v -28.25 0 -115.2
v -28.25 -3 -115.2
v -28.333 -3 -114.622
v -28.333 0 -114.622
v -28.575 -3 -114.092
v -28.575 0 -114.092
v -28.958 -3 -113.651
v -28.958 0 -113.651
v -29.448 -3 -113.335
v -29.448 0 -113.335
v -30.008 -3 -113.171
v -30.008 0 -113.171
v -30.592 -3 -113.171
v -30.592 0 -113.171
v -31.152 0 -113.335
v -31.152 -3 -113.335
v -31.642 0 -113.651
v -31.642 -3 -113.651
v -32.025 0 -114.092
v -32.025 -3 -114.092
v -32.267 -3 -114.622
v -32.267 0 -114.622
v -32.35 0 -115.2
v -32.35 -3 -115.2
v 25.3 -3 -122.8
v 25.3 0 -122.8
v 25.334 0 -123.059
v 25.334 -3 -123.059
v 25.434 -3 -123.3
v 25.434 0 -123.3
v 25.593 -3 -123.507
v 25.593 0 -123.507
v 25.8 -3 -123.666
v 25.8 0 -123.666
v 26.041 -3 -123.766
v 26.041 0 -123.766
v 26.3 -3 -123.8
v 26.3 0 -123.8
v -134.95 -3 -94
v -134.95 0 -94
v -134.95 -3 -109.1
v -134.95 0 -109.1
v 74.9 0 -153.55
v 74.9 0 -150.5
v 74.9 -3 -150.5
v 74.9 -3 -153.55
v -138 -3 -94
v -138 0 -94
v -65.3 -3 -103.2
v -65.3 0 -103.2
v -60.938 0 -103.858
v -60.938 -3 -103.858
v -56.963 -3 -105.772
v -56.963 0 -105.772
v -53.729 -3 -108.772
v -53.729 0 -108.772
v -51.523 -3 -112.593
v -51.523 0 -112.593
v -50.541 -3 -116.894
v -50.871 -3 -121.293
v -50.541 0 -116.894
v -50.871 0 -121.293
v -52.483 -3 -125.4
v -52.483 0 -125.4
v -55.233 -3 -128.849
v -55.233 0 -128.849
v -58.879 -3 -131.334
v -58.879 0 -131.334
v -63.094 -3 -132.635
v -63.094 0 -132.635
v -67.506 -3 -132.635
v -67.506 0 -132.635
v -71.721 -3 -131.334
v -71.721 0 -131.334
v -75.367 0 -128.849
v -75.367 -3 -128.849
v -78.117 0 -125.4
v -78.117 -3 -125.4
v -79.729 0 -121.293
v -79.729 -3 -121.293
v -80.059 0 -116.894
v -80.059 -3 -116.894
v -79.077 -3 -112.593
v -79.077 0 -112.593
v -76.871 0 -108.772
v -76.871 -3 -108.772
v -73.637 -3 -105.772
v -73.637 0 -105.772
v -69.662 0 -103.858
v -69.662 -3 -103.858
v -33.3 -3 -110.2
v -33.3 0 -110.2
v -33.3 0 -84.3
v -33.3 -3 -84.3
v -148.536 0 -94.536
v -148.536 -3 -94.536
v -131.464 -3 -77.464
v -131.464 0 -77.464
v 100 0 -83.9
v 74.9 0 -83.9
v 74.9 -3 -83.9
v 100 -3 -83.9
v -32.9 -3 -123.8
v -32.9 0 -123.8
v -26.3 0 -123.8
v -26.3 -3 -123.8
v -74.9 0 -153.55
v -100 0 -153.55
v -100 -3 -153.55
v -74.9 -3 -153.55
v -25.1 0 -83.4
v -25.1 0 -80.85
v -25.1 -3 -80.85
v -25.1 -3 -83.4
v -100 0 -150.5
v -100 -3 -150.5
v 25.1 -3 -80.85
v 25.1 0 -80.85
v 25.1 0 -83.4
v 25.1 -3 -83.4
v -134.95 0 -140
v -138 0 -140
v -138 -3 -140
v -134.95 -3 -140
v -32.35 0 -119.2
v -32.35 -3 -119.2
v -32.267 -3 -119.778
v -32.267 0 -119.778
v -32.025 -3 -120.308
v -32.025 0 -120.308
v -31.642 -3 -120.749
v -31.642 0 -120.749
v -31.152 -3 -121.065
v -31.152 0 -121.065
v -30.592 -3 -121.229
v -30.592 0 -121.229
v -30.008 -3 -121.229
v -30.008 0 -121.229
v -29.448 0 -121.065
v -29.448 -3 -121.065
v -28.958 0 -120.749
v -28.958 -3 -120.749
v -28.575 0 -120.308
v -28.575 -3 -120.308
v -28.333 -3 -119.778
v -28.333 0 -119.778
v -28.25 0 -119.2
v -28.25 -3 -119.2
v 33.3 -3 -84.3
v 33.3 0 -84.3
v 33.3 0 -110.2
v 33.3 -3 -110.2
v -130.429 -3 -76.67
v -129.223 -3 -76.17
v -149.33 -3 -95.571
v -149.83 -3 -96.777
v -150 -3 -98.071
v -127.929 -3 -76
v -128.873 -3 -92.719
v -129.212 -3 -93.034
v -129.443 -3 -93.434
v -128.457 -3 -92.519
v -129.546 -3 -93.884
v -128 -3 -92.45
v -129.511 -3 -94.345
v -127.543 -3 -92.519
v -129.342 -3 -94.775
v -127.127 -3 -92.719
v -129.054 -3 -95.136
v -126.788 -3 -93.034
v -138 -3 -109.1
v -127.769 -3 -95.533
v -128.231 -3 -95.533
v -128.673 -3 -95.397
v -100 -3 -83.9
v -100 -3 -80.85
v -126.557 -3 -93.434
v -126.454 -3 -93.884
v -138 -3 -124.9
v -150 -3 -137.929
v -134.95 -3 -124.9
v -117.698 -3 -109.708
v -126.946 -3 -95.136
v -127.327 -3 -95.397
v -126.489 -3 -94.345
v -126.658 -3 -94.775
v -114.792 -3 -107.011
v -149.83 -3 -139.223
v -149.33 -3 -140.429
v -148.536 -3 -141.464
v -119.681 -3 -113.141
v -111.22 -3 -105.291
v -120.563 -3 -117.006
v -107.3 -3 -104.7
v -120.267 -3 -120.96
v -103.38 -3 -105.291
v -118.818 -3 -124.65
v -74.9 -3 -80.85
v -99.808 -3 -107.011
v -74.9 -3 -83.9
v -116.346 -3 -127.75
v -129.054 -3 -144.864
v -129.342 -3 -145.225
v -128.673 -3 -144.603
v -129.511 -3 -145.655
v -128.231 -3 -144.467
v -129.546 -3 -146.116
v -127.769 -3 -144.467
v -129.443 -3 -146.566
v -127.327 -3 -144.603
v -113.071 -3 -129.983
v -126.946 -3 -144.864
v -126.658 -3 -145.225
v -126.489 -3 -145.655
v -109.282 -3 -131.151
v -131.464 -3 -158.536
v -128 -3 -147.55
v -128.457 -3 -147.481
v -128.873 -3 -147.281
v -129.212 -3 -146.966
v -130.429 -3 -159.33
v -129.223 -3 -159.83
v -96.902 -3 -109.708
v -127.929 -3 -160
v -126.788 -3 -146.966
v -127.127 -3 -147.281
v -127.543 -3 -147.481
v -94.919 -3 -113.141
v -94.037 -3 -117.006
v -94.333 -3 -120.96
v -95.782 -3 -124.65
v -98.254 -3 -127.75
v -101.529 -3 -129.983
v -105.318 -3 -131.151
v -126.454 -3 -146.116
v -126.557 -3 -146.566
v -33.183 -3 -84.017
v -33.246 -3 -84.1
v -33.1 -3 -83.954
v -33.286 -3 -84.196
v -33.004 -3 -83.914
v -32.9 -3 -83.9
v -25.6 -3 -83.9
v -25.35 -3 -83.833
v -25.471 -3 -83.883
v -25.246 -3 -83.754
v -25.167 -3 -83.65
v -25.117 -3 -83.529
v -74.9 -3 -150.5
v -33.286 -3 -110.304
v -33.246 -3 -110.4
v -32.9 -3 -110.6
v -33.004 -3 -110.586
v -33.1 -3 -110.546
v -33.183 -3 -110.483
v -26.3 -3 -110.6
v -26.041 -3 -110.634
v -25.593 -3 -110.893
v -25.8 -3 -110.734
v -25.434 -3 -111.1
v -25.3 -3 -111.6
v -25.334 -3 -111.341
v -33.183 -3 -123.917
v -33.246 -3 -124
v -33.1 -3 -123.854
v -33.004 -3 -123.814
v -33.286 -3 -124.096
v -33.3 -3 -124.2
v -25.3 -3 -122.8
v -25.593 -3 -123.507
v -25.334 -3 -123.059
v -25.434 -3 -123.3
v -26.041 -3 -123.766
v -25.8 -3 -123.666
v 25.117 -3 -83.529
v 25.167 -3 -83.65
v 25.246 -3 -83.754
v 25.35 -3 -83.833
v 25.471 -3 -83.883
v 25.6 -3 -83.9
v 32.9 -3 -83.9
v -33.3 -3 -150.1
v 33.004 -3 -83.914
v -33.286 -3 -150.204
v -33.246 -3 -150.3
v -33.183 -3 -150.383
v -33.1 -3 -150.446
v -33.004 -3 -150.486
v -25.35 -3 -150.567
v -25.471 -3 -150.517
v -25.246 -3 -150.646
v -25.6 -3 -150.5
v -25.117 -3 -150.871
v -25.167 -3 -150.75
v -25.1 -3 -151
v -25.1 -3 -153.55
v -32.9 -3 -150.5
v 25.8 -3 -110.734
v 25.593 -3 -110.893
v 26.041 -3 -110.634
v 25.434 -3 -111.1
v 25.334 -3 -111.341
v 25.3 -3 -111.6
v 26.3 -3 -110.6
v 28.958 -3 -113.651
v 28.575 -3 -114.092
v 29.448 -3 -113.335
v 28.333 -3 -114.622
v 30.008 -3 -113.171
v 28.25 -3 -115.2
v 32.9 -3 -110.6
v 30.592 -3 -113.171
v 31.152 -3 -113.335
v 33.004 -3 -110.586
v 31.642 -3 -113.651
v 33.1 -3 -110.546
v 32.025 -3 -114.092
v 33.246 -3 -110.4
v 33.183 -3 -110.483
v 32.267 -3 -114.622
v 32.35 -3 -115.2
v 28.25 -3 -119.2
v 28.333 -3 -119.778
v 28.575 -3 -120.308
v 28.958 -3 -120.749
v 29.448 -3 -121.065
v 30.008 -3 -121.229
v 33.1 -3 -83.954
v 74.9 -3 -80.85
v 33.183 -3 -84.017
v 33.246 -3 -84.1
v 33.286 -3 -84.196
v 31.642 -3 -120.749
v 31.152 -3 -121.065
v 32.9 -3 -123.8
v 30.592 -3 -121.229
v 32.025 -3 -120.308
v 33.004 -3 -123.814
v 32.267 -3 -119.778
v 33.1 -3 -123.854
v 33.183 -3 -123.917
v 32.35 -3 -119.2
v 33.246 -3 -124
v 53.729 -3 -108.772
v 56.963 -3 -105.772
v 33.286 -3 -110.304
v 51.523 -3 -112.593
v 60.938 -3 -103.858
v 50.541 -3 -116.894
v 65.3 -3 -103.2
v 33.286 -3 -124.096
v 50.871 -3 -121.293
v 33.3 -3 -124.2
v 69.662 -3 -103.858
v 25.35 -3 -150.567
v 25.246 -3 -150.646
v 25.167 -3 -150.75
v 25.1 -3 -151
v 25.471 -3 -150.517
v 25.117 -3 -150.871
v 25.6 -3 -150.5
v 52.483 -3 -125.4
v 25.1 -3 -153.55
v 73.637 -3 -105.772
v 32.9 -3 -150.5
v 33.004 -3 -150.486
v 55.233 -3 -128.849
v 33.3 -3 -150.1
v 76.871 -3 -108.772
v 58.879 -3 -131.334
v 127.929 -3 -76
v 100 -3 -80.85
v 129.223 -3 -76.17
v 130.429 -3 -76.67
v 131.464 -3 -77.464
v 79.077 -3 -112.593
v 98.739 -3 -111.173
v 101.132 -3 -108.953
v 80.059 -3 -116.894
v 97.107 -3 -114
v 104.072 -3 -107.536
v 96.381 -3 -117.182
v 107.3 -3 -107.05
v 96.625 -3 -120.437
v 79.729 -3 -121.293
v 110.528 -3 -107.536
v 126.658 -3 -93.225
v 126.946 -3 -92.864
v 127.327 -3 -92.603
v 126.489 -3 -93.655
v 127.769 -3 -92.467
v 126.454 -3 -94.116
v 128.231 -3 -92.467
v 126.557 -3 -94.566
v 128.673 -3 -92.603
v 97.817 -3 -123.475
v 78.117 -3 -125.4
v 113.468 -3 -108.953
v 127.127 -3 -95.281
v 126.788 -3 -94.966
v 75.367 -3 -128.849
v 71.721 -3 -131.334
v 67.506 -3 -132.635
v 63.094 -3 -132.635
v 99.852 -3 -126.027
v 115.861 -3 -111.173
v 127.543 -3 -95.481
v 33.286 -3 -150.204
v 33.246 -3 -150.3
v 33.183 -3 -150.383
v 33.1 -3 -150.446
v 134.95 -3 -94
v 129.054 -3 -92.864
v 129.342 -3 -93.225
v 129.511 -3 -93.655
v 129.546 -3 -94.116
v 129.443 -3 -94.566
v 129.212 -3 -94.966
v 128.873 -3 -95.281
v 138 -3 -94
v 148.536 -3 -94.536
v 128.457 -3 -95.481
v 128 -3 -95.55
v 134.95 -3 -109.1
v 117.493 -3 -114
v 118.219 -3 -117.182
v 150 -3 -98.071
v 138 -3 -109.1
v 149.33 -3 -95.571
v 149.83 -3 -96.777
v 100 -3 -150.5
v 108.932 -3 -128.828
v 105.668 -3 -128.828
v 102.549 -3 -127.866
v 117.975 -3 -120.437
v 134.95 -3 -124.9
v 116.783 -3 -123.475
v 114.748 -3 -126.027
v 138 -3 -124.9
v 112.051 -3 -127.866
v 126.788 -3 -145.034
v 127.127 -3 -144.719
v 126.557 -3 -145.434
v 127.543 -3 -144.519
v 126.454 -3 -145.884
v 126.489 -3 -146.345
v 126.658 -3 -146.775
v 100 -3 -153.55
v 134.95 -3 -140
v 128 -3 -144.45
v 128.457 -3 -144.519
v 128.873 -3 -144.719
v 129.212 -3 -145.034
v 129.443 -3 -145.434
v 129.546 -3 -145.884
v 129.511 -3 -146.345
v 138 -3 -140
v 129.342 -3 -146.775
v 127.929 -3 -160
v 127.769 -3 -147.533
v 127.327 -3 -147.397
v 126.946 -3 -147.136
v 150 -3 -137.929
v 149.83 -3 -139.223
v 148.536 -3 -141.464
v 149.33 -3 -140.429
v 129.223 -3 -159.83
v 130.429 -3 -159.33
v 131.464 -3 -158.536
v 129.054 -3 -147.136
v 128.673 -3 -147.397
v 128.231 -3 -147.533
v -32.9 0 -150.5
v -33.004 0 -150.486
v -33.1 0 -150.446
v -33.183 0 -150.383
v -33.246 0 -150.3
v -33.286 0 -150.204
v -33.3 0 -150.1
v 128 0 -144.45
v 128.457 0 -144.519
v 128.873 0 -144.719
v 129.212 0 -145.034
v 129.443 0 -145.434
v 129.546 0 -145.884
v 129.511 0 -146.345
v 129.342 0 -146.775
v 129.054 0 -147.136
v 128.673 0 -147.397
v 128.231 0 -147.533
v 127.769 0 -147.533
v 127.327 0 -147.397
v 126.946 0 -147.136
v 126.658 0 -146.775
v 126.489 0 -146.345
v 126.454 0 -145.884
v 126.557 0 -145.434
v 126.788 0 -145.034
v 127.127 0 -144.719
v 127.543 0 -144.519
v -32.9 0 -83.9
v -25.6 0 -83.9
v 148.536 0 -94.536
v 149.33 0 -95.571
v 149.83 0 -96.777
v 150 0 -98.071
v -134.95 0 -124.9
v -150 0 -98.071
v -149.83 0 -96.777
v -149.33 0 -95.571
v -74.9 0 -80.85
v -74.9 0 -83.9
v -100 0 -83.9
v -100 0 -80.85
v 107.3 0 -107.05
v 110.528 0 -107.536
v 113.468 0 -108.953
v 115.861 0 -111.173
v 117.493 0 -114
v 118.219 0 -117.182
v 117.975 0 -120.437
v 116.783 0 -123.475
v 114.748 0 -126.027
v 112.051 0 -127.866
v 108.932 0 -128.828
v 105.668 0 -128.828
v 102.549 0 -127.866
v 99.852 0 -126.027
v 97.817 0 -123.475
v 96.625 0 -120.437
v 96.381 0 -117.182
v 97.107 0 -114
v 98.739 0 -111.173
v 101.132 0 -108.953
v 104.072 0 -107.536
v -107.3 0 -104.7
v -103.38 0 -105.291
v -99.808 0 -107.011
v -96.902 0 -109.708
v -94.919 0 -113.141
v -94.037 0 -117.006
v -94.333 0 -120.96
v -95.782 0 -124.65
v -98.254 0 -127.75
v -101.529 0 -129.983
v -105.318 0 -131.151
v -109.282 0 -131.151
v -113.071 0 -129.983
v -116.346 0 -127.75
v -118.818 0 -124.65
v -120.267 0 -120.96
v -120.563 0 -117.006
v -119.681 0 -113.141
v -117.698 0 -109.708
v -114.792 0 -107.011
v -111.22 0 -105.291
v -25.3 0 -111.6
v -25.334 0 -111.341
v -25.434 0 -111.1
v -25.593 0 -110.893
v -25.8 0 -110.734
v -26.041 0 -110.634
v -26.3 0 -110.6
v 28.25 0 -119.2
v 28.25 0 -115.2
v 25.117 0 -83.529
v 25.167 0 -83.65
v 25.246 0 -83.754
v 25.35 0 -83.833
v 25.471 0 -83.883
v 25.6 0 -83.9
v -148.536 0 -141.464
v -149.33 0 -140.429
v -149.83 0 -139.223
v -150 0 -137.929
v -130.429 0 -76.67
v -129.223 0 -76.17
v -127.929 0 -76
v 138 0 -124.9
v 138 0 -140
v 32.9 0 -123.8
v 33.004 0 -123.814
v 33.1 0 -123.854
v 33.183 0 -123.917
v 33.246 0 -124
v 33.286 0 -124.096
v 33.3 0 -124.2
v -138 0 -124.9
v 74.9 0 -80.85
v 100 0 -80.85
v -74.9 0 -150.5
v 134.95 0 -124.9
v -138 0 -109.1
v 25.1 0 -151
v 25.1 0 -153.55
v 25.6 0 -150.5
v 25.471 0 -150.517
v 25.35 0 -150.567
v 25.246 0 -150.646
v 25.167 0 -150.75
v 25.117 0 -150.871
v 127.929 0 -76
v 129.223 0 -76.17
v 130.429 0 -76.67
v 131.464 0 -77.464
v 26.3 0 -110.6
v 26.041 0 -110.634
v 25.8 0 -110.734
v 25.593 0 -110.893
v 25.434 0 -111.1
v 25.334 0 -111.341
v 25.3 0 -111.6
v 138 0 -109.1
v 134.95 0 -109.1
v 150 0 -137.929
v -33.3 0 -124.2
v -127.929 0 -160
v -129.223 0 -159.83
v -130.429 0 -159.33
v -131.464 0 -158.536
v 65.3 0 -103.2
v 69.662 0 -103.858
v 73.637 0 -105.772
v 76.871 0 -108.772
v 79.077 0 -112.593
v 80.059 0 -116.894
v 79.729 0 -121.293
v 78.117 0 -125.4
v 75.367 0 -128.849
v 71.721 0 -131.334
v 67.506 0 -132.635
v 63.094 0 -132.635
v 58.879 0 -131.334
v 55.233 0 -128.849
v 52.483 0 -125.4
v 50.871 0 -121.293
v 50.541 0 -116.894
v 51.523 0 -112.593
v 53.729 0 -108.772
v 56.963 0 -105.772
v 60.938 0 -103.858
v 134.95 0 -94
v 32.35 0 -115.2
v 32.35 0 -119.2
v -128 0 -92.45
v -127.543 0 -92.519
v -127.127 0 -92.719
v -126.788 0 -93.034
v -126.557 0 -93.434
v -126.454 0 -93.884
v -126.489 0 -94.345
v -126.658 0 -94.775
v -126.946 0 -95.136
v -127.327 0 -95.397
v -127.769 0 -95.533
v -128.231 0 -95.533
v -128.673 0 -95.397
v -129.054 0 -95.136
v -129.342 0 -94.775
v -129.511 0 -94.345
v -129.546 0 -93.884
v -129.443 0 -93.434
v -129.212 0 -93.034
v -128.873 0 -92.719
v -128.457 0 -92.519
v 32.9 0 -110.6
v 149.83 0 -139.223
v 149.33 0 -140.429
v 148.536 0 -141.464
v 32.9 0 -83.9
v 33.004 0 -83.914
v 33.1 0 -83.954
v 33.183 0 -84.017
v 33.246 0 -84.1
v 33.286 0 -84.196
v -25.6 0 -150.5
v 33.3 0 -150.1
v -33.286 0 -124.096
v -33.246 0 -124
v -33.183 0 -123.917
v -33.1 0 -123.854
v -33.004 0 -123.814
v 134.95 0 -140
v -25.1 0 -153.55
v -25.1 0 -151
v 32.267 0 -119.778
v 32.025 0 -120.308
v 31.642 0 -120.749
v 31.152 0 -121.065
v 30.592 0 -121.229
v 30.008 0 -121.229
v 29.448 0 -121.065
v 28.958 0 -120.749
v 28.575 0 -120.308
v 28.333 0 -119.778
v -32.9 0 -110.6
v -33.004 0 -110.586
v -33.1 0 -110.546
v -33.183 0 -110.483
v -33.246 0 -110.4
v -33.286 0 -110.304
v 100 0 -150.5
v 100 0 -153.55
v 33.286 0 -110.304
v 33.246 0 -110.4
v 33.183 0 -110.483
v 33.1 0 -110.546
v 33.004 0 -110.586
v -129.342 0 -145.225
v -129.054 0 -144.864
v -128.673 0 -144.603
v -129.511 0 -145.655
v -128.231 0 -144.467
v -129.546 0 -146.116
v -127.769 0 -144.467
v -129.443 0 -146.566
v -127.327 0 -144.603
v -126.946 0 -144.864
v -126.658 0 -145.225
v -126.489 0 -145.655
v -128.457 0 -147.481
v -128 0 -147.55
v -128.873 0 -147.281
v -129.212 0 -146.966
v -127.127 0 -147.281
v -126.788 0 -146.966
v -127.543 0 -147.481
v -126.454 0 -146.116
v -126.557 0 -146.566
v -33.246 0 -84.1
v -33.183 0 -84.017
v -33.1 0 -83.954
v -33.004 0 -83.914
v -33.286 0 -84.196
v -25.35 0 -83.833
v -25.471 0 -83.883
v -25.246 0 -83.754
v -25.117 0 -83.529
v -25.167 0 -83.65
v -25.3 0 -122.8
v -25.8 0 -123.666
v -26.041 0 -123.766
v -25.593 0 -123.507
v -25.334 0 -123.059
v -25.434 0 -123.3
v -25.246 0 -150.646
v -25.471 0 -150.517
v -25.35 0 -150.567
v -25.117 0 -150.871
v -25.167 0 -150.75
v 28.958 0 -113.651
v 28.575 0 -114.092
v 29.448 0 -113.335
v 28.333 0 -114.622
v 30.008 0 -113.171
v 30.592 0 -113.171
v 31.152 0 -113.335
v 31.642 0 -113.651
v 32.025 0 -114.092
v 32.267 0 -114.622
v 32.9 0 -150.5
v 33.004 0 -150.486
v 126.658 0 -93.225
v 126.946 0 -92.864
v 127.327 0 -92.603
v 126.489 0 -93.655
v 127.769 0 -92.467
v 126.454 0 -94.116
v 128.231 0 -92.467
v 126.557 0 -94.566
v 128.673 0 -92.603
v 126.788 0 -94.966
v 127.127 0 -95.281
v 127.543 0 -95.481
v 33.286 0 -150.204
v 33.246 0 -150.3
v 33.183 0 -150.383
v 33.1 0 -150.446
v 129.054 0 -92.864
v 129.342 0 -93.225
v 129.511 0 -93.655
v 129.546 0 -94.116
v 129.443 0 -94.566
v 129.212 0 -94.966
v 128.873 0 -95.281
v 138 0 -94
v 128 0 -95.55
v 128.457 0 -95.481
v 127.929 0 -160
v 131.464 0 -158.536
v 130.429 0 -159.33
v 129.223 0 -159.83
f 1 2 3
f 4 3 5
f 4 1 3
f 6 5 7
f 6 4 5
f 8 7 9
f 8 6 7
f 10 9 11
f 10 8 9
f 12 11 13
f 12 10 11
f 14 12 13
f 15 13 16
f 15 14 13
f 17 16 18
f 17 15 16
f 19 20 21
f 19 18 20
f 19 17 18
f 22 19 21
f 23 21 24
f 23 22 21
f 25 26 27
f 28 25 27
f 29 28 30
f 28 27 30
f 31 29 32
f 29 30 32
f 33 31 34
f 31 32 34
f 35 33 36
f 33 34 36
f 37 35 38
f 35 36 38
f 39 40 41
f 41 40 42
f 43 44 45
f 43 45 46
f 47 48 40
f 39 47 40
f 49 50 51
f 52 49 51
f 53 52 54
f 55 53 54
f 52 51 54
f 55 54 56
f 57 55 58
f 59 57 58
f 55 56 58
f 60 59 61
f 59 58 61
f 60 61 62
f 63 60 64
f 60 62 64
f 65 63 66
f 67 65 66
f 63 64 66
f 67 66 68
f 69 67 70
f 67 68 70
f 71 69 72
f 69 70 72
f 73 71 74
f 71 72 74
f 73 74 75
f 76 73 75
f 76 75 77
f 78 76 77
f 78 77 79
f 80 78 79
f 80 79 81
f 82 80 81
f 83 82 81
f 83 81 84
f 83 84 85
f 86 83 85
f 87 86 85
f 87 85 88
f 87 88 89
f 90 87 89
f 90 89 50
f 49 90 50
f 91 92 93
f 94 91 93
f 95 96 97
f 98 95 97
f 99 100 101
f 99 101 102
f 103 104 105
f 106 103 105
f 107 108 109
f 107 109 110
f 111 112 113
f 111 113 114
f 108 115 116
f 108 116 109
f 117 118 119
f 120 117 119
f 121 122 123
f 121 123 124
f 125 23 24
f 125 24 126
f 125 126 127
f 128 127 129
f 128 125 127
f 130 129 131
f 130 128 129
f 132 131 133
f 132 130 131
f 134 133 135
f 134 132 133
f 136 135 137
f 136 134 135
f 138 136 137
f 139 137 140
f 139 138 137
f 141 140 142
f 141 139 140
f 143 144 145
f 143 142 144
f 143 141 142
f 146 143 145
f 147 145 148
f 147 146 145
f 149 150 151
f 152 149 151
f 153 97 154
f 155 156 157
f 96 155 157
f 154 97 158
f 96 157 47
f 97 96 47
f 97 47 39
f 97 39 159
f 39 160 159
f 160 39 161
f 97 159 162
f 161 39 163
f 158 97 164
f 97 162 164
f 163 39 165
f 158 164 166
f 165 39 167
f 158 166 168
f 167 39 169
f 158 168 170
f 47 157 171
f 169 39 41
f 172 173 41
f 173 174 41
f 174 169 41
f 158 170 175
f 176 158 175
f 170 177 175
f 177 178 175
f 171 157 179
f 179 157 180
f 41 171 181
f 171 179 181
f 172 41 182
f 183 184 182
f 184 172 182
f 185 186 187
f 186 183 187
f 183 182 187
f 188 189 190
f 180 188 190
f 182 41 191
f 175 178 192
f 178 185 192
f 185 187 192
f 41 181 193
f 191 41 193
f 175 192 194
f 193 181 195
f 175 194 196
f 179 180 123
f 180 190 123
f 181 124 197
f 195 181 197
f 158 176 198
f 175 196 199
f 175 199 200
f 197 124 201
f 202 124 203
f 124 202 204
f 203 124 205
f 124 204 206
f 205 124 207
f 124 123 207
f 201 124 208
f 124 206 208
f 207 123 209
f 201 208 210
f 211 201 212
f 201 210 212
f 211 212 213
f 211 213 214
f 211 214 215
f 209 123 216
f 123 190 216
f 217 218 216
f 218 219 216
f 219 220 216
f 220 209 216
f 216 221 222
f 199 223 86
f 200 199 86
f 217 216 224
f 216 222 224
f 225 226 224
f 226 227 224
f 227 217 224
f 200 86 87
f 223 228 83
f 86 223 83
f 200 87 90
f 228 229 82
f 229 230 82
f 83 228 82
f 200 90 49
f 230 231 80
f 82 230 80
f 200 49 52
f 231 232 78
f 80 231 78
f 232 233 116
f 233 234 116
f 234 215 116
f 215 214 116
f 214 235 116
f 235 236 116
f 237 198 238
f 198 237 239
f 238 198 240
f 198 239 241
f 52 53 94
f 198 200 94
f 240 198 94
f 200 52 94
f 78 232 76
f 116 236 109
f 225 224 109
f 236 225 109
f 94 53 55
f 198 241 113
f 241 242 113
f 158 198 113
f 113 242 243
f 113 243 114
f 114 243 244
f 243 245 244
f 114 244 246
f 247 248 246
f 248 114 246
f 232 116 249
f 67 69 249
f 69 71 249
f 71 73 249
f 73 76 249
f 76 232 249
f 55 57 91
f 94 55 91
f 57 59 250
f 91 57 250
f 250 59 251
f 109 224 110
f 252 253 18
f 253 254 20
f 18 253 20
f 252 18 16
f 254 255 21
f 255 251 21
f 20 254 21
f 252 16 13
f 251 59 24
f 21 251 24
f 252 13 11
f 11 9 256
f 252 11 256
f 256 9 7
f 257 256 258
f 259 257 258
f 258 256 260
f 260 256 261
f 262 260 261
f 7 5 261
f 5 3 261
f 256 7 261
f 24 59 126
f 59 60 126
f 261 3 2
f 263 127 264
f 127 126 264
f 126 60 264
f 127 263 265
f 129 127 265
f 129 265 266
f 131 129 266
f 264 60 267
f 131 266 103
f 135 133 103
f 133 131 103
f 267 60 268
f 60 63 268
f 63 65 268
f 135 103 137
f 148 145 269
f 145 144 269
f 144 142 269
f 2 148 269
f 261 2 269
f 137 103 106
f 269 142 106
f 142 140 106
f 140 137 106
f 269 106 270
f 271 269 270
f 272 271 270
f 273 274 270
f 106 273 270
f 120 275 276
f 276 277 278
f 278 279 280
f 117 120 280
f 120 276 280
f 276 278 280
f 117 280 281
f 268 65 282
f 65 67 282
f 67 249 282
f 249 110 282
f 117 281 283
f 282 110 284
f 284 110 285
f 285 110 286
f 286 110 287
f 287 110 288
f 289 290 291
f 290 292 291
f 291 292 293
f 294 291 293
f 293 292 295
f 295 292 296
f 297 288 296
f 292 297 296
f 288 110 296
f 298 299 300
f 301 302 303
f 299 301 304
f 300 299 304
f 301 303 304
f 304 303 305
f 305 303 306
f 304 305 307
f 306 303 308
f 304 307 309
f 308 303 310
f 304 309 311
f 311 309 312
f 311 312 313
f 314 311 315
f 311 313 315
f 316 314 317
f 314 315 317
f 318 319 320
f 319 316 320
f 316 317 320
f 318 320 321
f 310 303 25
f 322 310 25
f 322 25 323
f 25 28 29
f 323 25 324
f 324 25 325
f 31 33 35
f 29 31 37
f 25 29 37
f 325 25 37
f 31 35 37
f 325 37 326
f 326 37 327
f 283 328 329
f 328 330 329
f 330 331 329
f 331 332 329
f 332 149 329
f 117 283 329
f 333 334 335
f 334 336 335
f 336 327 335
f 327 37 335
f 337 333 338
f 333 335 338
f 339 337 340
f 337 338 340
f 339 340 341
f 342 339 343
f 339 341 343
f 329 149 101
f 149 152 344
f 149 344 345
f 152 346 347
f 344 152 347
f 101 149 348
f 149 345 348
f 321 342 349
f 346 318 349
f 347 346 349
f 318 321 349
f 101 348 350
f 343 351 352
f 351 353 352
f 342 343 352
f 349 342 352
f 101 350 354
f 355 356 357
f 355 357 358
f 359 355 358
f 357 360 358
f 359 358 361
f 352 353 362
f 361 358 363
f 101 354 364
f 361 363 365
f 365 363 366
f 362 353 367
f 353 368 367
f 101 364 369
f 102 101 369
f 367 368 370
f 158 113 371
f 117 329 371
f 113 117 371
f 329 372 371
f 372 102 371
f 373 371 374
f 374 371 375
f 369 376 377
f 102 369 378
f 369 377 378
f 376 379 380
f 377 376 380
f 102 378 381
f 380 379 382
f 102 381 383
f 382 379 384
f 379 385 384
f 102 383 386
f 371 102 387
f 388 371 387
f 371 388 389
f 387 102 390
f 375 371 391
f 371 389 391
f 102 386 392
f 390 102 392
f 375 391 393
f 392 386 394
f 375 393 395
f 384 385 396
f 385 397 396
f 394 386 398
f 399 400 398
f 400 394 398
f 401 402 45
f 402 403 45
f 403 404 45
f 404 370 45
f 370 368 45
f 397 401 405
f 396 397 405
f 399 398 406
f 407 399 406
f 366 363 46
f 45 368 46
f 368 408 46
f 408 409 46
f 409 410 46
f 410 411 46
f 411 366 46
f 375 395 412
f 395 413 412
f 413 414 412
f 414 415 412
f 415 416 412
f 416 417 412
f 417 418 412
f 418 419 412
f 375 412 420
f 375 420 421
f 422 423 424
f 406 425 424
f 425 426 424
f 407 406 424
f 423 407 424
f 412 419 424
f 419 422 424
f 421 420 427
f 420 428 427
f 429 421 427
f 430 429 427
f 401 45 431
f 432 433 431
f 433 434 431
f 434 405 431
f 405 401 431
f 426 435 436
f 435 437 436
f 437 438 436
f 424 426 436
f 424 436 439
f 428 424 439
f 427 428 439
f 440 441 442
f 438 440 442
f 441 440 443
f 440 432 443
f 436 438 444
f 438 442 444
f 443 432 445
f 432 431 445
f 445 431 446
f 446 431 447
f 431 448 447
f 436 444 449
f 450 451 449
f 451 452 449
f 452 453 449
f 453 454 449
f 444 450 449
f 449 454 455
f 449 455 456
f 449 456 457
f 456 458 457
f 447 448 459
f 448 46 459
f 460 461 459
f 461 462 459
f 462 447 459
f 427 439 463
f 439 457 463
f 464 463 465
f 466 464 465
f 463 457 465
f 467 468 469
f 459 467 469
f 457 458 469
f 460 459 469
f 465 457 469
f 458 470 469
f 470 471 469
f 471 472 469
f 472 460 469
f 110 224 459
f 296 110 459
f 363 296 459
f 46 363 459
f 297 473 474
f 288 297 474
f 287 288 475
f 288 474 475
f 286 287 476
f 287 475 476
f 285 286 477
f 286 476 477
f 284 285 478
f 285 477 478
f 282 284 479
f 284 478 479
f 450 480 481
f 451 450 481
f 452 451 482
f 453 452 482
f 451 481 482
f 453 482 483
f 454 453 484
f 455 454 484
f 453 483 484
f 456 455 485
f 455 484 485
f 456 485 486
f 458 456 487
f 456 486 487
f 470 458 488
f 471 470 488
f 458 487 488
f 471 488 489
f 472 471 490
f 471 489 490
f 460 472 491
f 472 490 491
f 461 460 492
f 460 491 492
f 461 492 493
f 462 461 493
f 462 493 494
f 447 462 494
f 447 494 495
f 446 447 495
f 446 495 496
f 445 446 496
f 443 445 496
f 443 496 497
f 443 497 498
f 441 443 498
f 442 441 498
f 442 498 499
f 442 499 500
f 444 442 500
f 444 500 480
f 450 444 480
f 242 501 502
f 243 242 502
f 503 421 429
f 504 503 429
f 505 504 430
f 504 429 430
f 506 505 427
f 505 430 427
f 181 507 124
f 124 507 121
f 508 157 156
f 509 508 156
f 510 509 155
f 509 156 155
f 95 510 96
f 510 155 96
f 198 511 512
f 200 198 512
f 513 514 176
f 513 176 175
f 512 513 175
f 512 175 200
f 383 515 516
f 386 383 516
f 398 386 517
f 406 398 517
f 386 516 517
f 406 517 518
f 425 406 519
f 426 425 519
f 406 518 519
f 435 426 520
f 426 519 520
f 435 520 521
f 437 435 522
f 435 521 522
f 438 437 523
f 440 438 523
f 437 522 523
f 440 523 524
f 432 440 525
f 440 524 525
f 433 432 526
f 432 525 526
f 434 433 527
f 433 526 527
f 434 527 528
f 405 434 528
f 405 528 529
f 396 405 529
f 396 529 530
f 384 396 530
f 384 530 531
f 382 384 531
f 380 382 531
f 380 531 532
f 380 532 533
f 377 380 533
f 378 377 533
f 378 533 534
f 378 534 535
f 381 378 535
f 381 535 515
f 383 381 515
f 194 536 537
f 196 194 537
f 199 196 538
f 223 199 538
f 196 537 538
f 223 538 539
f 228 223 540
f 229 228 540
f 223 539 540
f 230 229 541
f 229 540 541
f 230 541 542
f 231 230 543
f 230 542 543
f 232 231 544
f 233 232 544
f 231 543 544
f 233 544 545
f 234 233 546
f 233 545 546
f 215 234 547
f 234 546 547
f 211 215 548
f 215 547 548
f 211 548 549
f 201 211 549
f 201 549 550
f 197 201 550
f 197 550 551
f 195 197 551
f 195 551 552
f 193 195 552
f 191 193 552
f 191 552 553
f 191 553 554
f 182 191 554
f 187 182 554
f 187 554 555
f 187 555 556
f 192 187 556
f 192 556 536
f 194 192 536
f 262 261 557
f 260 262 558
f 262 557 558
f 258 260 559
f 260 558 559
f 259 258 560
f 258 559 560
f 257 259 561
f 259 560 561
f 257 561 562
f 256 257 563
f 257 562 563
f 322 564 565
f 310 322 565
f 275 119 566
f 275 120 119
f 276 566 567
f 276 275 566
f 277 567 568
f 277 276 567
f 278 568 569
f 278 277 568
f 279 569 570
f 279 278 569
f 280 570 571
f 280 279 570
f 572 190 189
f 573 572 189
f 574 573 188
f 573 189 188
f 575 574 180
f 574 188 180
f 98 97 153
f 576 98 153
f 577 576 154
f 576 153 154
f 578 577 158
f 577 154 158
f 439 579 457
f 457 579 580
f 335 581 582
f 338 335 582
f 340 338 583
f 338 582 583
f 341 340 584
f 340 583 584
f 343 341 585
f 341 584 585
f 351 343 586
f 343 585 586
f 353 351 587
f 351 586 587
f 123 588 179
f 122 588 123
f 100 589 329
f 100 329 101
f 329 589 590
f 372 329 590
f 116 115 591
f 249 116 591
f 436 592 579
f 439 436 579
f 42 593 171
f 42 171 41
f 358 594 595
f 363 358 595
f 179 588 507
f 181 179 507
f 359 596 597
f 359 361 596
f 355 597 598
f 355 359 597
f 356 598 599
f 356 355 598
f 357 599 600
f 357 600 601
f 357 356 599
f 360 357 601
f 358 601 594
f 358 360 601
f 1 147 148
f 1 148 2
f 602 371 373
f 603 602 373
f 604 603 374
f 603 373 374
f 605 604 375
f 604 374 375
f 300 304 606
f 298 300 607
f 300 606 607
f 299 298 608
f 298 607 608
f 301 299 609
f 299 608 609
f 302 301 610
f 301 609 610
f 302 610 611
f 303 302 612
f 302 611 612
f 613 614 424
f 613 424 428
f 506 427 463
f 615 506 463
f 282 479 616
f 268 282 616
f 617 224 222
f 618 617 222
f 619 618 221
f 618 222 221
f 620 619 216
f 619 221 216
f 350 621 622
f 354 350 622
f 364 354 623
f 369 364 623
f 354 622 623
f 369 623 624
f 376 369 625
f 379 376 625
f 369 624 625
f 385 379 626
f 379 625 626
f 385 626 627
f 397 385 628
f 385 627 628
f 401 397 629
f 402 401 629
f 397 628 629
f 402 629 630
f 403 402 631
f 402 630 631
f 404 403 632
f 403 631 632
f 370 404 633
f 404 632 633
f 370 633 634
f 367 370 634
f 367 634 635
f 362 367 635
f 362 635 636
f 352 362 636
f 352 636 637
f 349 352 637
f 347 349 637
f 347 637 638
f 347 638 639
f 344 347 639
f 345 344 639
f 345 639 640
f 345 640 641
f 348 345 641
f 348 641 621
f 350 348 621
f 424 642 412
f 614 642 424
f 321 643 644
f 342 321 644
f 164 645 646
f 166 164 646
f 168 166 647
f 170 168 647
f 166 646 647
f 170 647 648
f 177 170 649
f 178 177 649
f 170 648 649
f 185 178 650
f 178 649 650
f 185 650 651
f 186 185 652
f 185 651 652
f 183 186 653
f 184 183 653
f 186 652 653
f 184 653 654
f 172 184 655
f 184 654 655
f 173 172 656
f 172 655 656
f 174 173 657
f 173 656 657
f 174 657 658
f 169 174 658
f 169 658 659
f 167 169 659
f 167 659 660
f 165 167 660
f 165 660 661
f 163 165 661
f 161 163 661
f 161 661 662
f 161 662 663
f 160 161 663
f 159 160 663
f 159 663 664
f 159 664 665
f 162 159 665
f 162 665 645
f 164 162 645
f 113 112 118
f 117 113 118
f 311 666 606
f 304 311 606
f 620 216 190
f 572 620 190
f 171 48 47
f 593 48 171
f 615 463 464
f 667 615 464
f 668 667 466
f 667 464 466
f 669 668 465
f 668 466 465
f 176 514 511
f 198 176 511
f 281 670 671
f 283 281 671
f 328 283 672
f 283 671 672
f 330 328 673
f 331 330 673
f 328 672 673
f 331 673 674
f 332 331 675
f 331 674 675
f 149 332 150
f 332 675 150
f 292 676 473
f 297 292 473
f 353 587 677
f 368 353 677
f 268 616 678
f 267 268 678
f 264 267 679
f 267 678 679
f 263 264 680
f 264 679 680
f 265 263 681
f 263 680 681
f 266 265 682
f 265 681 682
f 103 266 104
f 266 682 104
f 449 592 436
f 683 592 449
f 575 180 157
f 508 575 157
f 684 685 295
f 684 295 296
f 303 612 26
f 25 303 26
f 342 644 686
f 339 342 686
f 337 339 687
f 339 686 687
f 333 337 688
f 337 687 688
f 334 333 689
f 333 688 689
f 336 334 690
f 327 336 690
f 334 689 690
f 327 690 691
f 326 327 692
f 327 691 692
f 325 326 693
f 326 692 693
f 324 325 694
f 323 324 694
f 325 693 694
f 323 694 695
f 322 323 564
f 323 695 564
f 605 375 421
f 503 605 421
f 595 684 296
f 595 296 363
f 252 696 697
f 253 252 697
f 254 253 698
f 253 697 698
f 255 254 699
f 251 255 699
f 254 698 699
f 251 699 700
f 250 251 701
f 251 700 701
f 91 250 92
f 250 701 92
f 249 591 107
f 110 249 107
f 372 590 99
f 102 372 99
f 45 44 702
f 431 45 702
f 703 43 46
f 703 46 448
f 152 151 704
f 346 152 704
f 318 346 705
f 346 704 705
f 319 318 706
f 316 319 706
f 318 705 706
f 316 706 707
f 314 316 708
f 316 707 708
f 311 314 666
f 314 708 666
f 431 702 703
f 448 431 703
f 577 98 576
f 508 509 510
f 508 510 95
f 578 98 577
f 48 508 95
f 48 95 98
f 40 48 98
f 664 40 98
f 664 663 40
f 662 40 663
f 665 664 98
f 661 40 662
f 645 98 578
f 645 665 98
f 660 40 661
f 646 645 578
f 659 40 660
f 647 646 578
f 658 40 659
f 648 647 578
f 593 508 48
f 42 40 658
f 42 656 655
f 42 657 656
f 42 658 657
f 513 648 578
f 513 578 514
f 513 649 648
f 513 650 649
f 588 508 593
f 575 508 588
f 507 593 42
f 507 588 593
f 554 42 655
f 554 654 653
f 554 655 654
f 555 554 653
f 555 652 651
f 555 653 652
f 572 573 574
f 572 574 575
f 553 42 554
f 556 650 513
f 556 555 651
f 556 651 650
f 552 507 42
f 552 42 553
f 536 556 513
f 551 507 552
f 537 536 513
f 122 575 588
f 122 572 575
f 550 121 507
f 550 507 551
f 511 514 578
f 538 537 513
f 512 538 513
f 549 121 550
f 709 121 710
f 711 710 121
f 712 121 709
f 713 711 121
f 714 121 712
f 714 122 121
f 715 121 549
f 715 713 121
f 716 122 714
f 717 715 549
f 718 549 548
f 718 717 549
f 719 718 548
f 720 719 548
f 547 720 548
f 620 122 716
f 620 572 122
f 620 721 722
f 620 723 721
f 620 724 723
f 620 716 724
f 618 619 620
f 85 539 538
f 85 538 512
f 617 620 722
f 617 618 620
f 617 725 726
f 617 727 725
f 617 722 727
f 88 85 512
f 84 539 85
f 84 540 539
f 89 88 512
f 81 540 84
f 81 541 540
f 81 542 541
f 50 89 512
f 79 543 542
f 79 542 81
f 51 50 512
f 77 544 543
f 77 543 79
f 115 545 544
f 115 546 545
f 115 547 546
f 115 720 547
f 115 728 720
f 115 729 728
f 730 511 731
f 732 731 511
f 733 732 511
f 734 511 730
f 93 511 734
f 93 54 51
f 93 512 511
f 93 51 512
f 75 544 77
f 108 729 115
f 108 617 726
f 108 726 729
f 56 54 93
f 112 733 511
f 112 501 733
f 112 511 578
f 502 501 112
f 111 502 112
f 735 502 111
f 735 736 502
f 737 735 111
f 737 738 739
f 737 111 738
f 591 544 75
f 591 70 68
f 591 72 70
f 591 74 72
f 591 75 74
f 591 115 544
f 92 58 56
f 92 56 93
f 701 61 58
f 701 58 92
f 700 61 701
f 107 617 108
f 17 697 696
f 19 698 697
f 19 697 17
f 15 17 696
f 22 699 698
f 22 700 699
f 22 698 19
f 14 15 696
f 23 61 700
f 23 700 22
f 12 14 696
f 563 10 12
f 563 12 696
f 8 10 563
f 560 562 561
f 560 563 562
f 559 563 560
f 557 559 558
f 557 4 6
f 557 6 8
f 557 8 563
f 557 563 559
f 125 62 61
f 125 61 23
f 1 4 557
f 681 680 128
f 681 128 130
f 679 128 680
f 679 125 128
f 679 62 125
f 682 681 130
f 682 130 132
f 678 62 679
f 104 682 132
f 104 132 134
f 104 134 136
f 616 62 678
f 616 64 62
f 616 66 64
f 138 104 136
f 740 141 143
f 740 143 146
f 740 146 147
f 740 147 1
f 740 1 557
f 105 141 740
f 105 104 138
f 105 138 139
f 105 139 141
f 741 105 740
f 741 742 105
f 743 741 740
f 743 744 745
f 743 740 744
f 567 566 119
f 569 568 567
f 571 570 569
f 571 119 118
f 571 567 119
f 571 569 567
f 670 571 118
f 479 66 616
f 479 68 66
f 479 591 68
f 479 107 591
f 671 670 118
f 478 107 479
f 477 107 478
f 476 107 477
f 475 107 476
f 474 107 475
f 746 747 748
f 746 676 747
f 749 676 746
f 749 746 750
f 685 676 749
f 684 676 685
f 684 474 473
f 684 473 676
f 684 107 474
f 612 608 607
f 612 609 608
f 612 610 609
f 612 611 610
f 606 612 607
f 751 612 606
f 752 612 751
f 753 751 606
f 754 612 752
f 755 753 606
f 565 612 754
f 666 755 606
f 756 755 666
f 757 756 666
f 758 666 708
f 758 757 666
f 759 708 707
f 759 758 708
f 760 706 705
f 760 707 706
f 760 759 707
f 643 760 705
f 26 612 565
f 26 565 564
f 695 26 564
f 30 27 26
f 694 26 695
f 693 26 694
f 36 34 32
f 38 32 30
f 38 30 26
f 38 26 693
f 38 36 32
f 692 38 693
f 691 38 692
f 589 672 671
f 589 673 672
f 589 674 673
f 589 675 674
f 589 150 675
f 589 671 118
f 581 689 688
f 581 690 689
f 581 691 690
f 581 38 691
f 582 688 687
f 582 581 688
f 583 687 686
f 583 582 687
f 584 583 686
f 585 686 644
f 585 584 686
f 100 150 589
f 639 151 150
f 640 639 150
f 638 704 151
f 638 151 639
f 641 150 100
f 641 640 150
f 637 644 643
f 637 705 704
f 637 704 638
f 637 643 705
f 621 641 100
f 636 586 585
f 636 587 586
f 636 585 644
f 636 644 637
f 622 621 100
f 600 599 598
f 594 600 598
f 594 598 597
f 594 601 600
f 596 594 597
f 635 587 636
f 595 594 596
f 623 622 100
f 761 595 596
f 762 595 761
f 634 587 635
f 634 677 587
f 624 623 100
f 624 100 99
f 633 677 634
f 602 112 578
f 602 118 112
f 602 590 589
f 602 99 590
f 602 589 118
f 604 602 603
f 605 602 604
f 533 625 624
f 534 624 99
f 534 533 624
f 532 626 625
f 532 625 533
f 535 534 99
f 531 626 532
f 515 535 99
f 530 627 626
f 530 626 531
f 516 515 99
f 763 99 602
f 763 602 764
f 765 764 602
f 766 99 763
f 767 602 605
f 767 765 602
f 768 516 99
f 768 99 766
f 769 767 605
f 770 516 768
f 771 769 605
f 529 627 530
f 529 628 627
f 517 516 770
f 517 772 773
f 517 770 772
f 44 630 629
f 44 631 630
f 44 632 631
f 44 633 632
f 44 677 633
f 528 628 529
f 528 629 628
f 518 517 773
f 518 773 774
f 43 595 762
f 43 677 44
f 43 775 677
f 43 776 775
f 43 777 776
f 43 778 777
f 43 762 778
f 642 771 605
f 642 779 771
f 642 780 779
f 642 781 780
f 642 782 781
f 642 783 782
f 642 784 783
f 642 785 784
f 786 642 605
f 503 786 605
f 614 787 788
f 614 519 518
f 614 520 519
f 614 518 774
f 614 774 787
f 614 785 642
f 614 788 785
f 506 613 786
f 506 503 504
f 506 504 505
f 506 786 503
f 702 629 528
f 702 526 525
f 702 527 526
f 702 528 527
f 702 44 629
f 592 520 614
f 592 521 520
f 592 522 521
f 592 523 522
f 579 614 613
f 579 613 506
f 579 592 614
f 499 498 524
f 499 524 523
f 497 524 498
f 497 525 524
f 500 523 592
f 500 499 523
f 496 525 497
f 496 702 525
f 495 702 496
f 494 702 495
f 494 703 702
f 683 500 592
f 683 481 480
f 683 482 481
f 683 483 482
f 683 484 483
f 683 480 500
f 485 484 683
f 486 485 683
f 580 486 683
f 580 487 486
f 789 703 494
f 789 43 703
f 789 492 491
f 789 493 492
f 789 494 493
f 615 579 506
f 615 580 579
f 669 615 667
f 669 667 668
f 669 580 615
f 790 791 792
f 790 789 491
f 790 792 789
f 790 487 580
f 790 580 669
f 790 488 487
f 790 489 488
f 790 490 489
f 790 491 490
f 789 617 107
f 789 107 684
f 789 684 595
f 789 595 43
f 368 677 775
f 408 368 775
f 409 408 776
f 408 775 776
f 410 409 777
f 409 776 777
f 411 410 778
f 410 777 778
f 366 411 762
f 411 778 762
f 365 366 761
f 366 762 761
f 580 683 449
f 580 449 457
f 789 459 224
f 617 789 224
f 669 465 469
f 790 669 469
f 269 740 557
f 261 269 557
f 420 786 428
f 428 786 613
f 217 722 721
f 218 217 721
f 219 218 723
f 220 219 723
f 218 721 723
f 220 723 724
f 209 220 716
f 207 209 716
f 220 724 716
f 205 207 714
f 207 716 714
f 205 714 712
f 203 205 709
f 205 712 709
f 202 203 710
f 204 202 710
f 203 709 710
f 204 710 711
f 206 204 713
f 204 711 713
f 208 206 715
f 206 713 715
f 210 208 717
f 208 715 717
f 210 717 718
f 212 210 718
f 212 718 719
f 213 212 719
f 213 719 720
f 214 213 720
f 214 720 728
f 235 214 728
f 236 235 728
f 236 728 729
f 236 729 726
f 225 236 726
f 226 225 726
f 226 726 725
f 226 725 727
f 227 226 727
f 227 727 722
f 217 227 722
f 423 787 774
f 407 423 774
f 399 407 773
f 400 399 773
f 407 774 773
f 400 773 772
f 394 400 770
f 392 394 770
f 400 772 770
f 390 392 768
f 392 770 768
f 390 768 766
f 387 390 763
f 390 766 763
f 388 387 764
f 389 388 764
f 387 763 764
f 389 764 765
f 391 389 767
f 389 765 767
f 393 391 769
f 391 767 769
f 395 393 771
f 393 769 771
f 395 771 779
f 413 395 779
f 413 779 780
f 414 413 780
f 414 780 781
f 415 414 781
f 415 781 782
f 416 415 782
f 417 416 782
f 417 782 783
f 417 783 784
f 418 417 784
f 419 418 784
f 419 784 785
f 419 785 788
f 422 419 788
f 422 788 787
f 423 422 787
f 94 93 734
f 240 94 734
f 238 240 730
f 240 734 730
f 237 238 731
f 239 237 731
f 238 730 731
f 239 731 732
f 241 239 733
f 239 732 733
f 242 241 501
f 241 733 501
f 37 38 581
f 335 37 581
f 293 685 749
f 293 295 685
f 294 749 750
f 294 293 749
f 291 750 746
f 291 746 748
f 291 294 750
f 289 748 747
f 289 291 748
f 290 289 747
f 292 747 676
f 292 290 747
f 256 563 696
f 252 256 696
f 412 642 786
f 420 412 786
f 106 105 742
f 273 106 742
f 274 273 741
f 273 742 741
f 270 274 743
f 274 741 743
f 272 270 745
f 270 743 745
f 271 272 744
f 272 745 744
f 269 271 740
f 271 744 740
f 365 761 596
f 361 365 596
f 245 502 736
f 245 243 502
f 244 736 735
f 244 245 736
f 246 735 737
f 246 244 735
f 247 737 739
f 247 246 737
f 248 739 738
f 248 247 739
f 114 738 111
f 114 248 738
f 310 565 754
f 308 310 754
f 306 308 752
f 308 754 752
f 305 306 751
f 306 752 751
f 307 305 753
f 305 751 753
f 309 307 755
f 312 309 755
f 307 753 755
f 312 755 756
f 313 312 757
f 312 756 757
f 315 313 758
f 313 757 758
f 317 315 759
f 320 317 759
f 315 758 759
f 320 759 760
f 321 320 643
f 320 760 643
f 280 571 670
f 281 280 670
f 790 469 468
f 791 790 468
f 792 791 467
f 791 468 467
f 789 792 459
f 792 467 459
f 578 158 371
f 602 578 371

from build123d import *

# Parameters (mm, degrees)
BASE_FLANGE1_START = -3
BASE_FLANGE1_DEPTH = 3
SKETCH6_R          = 1.55
CUT_EXTRUDE1_DEPTH = 10
SKETCH7_R          = 1.55
CUT_EXTRUDE2_DEPTH = 10
SKETCH9_R          = 14.8
SKETCH9_R_2        = 13.3
SKETCH9_R_3        = 10.95
CUT_EXTRUDE4_DEPTH = 10
SKETCH8_W          = 50.2
SKETCH8_H          = 3.05
SKETCH8_W_2        = 25.1
SKETCH8_W_3        = 3.05
SKETCH8_H_2        = 15.1
CUT_EXTRUDE5_DEPTH = 10
FILLET2_R          = 0.5


# Read off the part's stored shape, not the designer's step: Base-Flange1
with BuildPart() as part:
    # Base-Flange1 outline → Base-Flange1 (new body)
    with BuildSketch(Plane(origin=(0, 0, 0), x_dir=(1, 0, 0), z_dir=(0, 1, 0)).offset(BASE_FLANGE1_START)):
        with BuildLine():
            Line((-127.928932188, 76), (127.928932188, 76))
            ThreePointArc((127.928932188, 76), (129.84234935, 76.380602337), (131.464466094, 77.464466094))
            Line((131.464466094, 77.464466094), (148.535533906, 94.535533906))
            ThreePointArc((148.535533906, 94.535533906), (149.619397663, 96.15765065), (150, 98.071067812))
            Line((150, 98.071067812), (150, 137.928932188))
            ThreePointArc((150, 137.928932188), (149.619397663, 139.84234935), (148.535533906, 141.464466094))
            Line((148.535533906, 141.464466094), (131.464466094, 158.535533906))
            ThreePointArc((131.464466094, 158.535533906), (129.84234935, 159.619397663), (127.928932188, 160))
            Line((127.928932188, 160), (-127.928932188, 160))
            ThreePointArc((-127.928932188, 160), (-129.84234935, 159.619397663), (-131.464466094, 158.535533906))
            Line((-131.464466094, 158.535533906), (-148.535533906, 141.464466094))
            ThreePointArc((-148.535533906, 141.464466094), (-149.619397663, 139.84234935), (-150, 137.928932188))
            Line((-150, 137.928932188), (-150, 98.071067812))
            ThreePointArc((-150, 98.071067812), (-149.619397663, 96.15765065), (-148.535533906, 94.535533906))
            Line((-148.535533906, 94.535533906), (-131.464466094, 77.464466094))
            ThreePointArc((-131.464466094, 77.464466094), (-129.84234935, 76.380602337), (-127.928932188, 76))
        make_face()
    extrude(amount=BASE_FLANGE1_DEPTH)

    # Sketch6 → Cut-Extrude1 (cut)
    with BuildSketch(Plane(origin=(0, 0, 0), x_dir=(1, 0, 0), z_dir=(0, 1, 0))):
        with Locations(Location((128, 146, 0), (0, 0, 270))):
            Circle(SKETCH6_R)
        with Locations(Location((-128, 146, 0), (0, 0, 90))):
            Circle(SKETCH6_R)
    extrude(amount=-CUT_EXTRUDE1_DEPTH, mode=Mode.SUBTRACT)

    # Sketch7 → Cut-Extrude2 (cut)
    with BuildSketch(Plane(origin=(0, 0, 0), x_dir=(1, 0, 0), z_dir=(0, 1, 0))):
        with Locations(Location((-128, 94, 0), (0, 0, 270))):
            Circle(SKETCH7_R)
        with Locations(Location((128, 94, 0), (0, 0, 90))):
            Circle(SKETCH7_R)
    extrude(amount=-CUT_EXTRUDE2_DEPTH, mode=Mode.SUBTRACT)

    # Sketch9 → Cut-Extrude4 (cut)
    with BuildSketch(Plane(origin=(0, 0, 0), x_dir=(1, 0, 0), z_dir=(0, 1, 0))):
        with Locations(Location((-65.3, 118, 0), (0, 0, 270))):
            Circle(SKETCH9_R)
        with Locations(Location((65.3, 118, 0), (0, 0, 270))):
            Circle(SKETCH9_R)
        with Locations(Location((-107.3, 118, 0), (0, 0, 270))):
            Circle(SKETCH9_R_2)
        with Locations(Location((107.3, 118, 0), (0, 0, 270))):
            Circle(SKETCH9_R_3)
        with BuildLine():
            Line((-32.9, 83.9), (32.9, 83.9))
            ThreePointArc((32.9, 83.9), (33.182842712, 84.017157288), (33.3, 84.3))
            Line((33.3, 84.3), (33.3, 110.2))
            ThreePointArc((33.3, 110.2), (33.182842712, 110.482842712), (32.9, 110.6))
            Line((32.9, 110.6), (26.3, 110.6))
            ThreePointArc((26.3, 110.6), (25.592893219, 110.892893219), (25.3, 111.6))
            Line((25.3, 111.6), (25.3, 122.8))
            ThreePointArc((25.3, 122.8), (25.592893219, 123.507106781), (26.3, 123.8))
            Line((26.3, 123.8), (32.9, 123.8))
            ThreePointArc((32.9, 123.8), (33.182842712, 123.917157288), (33.3, 124.2))
            Line((33.3, 124.2), (33.3, 150.1))
            ThreePointArc((33.3, 150.1), (33.182842712, 150.382842712), (32.9, 150.5))
            Line((32.9, 150.5), (-32.9, 150.5))
            ThreePointArc((-32.9, 150.5), (-33.182842712, 150.382842712), (-33.3, 150.1))
            Line((-33.3, 150.1), (-33.3, 124.2))
            ThreePointArc((-33.3, 124.2), (-33.182842712, 123.917157288), (-32.9, 123.8))
            Line((-32.9, 123.8), (-26.3, 123.8))
            ThreePointArc((-26.3, 123.8), (-25.592893219, 123.507106781), (-25.3, 122.8))
            Line((-25.3, 122.8), (-25.3, 111.6))
            ThreePointArc((-25.3, 111.6), (-25.592893219, 110.892893219), (-26.3, 110.6))
            Line((-26.3, 110.6), (-32.9, 110.6))
            ThreePointArc((-32.9, 110.6), (-33.182842712, 110.482842712), (-33.3, 110.2))
            Line((-33.3, 110.2), (-33.3, 84.3))
            ThreePointArc((-33.3, 84.3), (-33.182842712, 84.017157288), (-32.9, 83.9))
        make_face()
        with BuildLine():
            Line((-28.25, 119.2), (-28.25, 115.2))
            ThreePointArc((-28.25, 115.2), (-30.3, 113.15), (-32.35, 115.2))
            Line((-32.35, 115.2), (-32.35, 119.2))
            ThreePointArc((-32.35, 119.2), (-30.3, 121.25), (-28.25, 119.2))
        make_face()
        with BuildLine():
            Line((28.25, 119.2), (28.25, 115.2))
            ThreePointArc((28.25, 115.2), (30.3, 113.15), (32.35, 115.2))
            Line((32.35, 115.2), (32.35, 119.2))
            ThreePointArc((32.35, 119.2), (30.3, 121.25), (28.25, 119.2))
        make_face()
    extrude(amount=-CUT_EXTRUDE4_DEPTH, mode=Mode.SUBTRACT)

    # Sketch8 → Cut-Extrude5 (cut)
    with BuildSketch(Plane(origin=(0, 0, 0), x_dir=(1, 0, 0), z_dir=(0, 1, 0))):
        with Locations((0, 82.375)):
            Rectangle(SKETCH8_W, SKETCH8_H)
        with Locations((87.45, 82.375)):
            Rectangle(SKETCH8_W_2, SKETCH8_H)
        with Locations((136.475, 132.45)):
            Rectangle(SKETCH8_W_3, SKETCH8_H_2)
        with Locations((0, 152.025)):
            Rectangle(SKETCH8_W, SKETCH8_H)
        with Locations((87.45, 152.025)):
            Rectangle(SKETCH8_W_2, SKETCH8_H)
        with Locations((-87.45, 152.025)):
            Rectangle(SKETCH8_W_2, SKETCH8_H)
        with Locations((136.475, 101.55)):
            Rectangle(SKETCH8_W_3, SKETCH8_H_2)
        with Locations((-87.45, 82.375)):
            Rectangle(SKETCH8_W_2, SKETCH8_H)
        with Locations((-136.475, 101.55)):
            Rectangle(SKETCH8_W_3, SKETCH8_H_2)
        with Locations((-136.475, 132.45)):
            Rectangle(SKETCH8_W_3, SKETCH8_H_2)
    extrude(amount=-CUT_EXTRUDE5_DEPTH, mode=Mode.SUBTRACT)

    # Fillet2
    fillet2_edges = [part.edges().sort_by_distance(p)[0] for p in [
        (-25.1, -1.5, -150.5),
        (25.1, -1.5, -150.5),
        (-25.1, -1.5, -83.9),
        (25.1, -1.5, -83.9),
    ]]
    fillet(fillet2_edges, radius=FILLET2_R)


solid = part.part
